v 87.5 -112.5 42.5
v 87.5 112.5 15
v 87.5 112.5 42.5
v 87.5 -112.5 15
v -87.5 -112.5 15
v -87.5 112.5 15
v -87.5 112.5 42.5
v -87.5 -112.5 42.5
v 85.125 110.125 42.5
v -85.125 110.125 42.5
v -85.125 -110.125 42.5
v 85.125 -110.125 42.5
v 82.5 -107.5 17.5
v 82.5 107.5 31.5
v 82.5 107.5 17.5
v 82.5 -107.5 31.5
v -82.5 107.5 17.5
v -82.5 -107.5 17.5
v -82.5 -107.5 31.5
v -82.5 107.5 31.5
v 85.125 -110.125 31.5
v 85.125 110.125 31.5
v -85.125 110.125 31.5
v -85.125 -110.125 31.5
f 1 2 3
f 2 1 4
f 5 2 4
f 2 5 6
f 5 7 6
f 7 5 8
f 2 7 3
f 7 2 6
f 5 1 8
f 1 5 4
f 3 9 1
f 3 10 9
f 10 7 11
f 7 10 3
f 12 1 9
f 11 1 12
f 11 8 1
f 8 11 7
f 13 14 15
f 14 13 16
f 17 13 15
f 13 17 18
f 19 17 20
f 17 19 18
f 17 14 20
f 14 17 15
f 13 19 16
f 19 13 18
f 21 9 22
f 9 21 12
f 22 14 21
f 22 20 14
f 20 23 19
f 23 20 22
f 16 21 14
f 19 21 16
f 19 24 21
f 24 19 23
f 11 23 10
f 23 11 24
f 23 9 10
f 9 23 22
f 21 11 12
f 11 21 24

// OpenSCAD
// file: BOSL2/std.scad
// Minimal BOSL2 compatibility shim for bundled gallery models.
// It implements only the helpers used by the imported OpenSCAD projects.

CENTER = [0, 0, 0];
BOTTOM = [0, 0, -1];
TOP = [0, 0, 1];
LEFT = [-1, 0, 0];
RIGHT = [1, 0, 0];
FRONT = [0, -1, 0];
BACK = [0, 1, 0];

module up(z=0) {
    translate([0, 0, z]) children();
}

module down(z=0) {
    translate([0, 0, -z]) children();
}

module attach(anchor=CENTER) {
    children();
}

module cuboid(size=[1, 1, 1], anchor=CENTER) {
    center = anchor == CENTER;
    translate(center ? [0, 0, 0] : [0, 0, size[2] / 2])
        cube(size, center=true);
    children();
}

module xcyl(h=1, r=1, anchor=CENTER) {
    center = anchor == CENTER;
    translate(center ? [0, 0, 0] : [h / 2, 0, 0])
        rotate([0, 90, 0])
            cylinder(h=h, r=r, center=true);
}
// main file
 include <BOSL2/std.scad>
 
 translate([0,0,32.5])
 {
 difference(){
    difference()
    {
        difference() 
        {
            //basic shape
            cuboid([175,225,35], rounding=6);
            //cut the top open
            translate ([0,0,25]) cuboid ([175,225,30]);
        }
        //hollow the interior
        cuboid ([165,215,30], rounding = 6);
    }
    //lip - the extra 0.25mm is "slop" so that the top lip will fit over the bottom
    translate ([0,0,5]) cuboid ([170.25,220.25,12], rounding = 6, edges="Z");
}
}
